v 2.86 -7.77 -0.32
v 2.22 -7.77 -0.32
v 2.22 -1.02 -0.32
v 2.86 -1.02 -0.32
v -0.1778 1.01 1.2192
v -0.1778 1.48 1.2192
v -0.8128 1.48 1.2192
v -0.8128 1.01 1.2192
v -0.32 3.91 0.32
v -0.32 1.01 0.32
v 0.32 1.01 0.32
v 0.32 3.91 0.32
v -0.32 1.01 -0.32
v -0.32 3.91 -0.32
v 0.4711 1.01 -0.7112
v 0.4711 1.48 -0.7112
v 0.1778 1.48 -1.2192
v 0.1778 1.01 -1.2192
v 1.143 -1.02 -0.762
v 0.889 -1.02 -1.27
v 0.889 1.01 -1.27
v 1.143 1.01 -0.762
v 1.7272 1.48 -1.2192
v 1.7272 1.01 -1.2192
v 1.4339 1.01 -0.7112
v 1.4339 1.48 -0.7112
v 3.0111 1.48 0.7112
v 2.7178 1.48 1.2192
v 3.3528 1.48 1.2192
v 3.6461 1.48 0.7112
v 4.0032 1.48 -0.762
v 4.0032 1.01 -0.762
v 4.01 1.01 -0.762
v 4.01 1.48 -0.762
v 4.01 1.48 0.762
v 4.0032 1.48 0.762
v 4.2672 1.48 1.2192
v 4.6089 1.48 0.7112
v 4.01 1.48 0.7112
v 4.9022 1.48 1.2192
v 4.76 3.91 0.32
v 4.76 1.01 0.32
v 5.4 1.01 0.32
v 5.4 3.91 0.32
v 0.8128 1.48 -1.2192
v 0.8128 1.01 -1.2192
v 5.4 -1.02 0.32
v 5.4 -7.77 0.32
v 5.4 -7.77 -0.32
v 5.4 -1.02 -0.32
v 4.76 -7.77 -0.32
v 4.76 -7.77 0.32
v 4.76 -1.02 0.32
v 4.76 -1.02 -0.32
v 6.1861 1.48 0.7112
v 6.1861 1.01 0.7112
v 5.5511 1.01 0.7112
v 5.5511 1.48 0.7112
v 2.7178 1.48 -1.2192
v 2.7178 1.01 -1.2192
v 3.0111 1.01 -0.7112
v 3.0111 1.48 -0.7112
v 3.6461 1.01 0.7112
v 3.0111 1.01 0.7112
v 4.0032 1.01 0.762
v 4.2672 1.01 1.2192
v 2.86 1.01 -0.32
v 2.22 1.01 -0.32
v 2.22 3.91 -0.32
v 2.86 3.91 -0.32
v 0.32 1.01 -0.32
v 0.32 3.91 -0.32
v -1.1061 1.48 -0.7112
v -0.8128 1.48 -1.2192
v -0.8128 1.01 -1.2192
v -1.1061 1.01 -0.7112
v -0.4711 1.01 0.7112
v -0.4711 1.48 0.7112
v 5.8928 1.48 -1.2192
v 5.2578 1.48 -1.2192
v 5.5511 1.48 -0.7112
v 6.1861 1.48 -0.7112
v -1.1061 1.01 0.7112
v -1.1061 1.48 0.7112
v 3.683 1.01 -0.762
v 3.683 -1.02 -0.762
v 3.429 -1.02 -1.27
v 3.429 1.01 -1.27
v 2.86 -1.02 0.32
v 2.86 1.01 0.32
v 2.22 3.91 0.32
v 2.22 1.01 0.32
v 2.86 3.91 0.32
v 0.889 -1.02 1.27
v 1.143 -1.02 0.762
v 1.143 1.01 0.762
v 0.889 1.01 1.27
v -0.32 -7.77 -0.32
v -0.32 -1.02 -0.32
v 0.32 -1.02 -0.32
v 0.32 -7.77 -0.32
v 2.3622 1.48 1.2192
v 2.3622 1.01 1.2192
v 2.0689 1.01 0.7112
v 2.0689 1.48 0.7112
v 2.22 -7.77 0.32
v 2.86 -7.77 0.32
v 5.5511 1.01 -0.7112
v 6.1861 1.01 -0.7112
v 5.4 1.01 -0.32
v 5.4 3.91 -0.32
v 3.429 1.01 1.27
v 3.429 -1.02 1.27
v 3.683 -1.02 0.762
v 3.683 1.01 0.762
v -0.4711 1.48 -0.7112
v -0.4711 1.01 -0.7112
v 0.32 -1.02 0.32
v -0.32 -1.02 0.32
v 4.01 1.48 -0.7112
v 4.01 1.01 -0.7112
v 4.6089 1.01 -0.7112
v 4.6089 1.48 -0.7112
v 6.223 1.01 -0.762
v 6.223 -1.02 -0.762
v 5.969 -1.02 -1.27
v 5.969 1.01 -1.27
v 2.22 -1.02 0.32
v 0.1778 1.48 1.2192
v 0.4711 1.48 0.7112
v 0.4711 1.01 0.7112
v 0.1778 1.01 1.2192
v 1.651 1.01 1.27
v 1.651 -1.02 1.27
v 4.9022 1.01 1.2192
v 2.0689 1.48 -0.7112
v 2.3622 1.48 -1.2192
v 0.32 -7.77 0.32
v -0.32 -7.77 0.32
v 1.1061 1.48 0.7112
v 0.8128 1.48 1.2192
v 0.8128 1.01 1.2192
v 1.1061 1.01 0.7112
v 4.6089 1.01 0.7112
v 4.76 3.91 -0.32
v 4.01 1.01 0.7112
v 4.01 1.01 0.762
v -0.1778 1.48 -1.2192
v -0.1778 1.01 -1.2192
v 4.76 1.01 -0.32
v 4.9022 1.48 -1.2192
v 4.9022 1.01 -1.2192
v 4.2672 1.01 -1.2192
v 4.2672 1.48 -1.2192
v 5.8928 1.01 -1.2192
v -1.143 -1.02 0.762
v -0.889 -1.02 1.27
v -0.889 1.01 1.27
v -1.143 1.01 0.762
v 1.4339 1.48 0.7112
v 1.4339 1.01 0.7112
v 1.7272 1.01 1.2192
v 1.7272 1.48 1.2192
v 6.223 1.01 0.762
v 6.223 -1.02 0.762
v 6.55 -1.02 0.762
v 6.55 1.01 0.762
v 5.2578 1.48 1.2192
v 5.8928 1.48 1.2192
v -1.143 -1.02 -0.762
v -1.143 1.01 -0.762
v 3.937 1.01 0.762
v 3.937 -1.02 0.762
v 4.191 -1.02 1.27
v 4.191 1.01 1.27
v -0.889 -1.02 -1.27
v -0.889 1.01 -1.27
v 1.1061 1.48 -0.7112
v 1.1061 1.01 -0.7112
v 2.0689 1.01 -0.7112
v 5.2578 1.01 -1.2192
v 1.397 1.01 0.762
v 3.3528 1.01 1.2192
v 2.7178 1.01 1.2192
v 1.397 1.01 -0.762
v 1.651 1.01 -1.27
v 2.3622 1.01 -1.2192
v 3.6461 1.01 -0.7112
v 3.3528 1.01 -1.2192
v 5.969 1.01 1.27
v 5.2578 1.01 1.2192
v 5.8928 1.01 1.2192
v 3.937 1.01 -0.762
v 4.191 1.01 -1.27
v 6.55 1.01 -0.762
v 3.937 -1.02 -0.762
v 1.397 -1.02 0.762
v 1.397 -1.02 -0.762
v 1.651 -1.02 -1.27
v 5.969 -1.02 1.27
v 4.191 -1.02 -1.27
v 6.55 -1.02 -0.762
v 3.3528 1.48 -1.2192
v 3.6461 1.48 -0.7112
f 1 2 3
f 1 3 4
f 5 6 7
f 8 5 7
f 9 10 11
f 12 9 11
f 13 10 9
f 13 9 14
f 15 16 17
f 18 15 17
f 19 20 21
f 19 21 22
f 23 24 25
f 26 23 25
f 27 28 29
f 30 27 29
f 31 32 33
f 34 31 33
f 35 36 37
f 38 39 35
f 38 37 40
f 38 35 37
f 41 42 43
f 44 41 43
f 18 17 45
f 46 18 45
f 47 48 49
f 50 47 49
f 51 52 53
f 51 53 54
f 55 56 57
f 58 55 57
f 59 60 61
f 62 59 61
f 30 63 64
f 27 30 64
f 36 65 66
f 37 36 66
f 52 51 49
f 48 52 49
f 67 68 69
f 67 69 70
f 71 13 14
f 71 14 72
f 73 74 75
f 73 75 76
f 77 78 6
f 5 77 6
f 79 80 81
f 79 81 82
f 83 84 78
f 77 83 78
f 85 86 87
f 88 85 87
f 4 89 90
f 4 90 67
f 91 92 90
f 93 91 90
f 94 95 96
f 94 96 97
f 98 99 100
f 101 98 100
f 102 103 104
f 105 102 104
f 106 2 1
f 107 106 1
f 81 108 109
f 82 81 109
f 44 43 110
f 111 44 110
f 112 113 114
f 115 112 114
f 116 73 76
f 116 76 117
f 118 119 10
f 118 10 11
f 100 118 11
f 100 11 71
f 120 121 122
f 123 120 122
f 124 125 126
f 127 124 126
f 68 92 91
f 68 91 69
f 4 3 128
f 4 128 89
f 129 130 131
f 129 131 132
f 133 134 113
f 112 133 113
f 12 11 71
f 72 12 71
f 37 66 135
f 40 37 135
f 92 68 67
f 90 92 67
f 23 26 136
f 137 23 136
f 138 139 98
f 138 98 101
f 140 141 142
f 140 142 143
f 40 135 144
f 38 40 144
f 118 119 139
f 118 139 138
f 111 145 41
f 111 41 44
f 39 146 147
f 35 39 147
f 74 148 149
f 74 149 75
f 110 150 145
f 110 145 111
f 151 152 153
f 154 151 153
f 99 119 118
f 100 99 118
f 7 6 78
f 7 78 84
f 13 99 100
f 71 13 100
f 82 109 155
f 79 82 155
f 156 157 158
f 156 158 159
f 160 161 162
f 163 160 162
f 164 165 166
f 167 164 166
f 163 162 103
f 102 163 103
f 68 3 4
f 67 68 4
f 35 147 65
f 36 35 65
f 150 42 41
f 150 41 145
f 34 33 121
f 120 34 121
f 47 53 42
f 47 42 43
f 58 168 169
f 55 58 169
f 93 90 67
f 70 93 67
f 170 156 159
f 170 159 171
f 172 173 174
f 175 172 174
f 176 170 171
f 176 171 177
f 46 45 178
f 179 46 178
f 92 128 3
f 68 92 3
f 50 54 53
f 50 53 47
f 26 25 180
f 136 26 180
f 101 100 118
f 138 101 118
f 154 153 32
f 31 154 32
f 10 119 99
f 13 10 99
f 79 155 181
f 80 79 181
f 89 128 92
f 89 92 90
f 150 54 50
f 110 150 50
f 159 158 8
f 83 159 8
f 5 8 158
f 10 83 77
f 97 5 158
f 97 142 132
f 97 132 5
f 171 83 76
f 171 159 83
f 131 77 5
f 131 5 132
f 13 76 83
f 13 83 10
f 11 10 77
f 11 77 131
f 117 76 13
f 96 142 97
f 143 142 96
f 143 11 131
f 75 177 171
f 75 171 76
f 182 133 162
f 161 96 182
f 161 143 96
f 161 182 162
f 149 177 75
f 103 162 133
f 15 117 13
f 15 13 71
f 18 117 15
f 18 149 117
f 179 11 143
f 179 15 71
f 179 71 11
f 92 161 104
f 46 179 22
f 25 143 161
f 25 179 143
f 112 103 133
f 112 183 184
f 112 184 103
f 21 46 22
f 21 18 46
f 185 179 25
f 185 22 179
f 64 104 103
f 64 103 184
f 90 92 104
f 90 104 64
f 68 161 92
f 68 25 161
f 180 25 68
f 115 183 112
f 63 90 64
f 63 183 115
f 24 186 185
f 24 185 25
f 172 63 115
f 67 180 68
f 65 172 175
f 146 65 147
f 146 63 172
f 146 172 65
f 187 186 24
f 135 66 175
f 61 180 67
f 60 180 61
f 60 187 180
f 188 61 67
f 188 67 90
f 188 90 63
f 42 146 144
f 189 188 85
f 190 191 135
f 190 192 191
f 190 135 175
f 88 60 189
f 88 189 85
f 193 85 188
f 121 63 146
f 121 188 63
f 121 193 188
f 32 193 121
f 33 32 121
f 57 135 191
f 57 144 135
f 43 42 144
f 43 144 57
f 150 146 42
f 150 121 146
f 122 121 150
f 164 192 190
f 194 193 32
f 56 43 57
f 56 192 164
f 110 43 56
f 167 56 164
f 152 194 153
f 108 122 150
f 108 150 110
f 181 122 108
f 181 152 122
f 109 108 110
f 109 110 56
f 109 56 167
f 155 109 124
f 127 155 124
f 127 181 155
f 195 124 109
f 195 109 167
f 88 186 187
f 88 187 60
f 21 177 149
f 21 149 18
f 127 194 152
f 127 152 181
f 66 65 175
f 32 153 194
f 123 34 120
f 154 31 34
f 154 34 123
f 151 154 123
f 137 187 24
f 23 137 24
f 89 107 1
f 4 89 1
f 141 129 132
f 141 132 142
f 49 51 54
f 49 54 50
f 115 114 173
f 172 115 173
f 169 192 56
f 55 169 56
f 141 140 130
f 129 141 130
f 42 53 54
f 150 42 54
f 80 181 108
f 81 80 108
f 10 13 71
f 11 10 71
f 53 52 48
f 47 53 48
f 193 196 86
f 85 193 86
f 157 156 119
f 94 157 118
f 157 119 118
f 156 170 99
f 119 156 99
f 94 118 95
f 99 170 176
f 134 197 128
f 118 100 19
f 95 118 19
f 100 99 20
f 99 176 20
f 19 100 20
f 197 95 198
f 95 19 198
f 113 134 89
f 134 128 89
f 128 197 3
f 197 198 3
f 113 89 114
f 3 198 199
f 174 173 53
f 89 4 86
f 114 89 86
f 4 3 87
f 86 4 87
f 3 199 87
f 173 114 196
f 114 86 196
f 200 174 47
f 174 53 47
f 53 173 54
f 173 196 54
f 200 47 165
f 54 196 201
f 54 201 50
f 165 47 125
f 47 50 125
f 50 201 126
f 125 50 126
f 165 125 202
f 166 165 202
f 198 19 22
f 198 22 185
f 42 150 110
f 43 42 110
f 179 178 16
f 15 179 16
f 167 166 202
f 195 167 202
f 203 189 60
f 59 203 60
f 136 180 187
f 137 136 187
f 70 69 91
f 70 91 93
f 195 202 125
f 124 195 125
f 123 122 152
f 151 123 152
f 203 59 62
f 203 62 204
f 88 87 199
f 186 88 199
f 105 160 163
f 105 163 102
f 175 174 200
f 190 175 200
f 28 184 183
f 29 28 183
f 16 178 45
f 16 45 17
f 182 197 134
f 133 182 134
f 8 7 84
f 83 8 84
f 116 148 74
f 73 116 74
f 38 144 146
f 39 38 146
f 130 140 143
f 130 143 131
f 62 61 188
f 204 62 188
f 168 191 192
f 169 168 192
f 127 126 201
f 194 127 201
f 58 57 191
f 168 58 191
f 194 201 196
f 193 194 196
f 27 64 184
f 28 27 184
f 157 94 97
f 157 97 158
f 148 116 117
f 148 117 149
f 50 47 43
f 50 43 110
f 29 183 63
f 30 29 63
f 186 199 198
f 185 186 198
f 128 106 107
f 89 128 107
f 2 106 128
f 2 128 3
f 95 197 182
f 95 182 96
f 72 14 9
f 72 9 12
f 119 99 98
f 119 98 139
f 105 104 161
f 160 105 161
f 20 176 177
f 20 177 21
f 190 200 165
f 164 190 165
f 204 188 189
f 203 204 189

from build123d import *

# Parameters (mm, degrees)
BOSS_EXTRUDE1_START = -1.02
SKETCH1_W           = 0.64
SKETCH1_H           = 0.64
BOSS_EXTRUDE1_DEPTH = 2.5
CUT_EXTRUDE2_DEPTH  = 0.47
SKETCH3_W           = 0.64
SKETCH3_H           = 0.64
BOSS_EXTRUDE2_DEPTH = 2.9
SKETCH4_W           = 0.64
SKETCH4_H           = 0.64
BOSS_EXTRUDE3_DEPTH = 6.75
LPATTERN1_COUNT     = 3
LPATTERN1_PITCH     = 2.54


with BuildPart() as part:
    # Sketch1 → Boss-Extrude1 (new body)
    with BuildSketch(Plane(origin=(0, 0, 0), x_dir=(1, 0, 0), z_dir=(0, 1, 0)).offset(BOSS_EXTRUDE1_START)):
        Polygon((-1.143, 0.762), (-0.889, 1.27), (0.889, 1.27), (1.143, 0.762), (1.47, 0.762), (1.47, -0.762), (1.143, -0.762), (0.889, -1.27), (-0.889, -1.27), (-1.143, -0.762), align=None)
        Rectangle(SKETCH1_W, SKETCH1_H, mode=Mode.SUBTRACT)
    boss_extrude1 = extrude(amount=BOSS_EXTRUDE1_DEPTH)

    # Sketch2 → Cut-Extrude2 (cut)
    with BuildSketch(Plane(origin=(0, 1.48, 0), x_dir=(1, 0, 0), z_dir=(0, 1, 0))):
        Polygon((-1.143, 0.762), (-1.143, -0.762), (-0.889, -1.27), (0.889, -1.27), (1.143, -0.762), (1.47, -0.762), (1.47, 0.762), (1.143, 0.762), (0.889, 1.27), (-0.889, 1.27), align=None)
        Polygon((-1.106093937, -0.7112), (-0.471093937, -0.7112), (-0.1778, -1.2192), (-0.8128, -1.2192), align=None, mode=Mode.SUBTRACT)
        Polygon((-0.8128, 1.2192), (-1.106093937, 0.7112), (-0.471093937, 0.7112), (-0.1778, 1.2192), align=None, mode=Mode.SUBTRACT)
        Polygon((1.106093937, 0.7112), (0.471093937, 0.7112), (0.1778, 1.2192), (0.8128, 1.2192), align=None, mode=Mode.SUBTRACT)
        Polygon((0.8128, -1.2192), (1.106093937, -0.7112), (0.471093937, -0.7112), (0.1778, -1.2192), align=None, mode=Mode.SUBTRACT)
    cut_extrude2 = extrude(amount=-CUT_EXTRUDE2_DEPTH, mode=Mode.SUBTRACT)


with BuildPart() as body_2:
    # Sketch3 → Boss-Extrude2 (new body)
    with BuildSketch(Plane(origin=(0, 1.01, 0), x_dir=(1, 0, 0), z_dir=(0, 1, 0))):
        Rectangle(SKETCH3_W, SKETCH3_H)
    boss_extrude2 = extrude(amount=BOSS_EXTRUDE2_DEPTH)


with BuildPart() as body_3:
    # Sketch4 → Boss-Extrude3 (new body)
    with BuildSketch(Plane.XZ.offset(1.02)):
        Rectangle(SKETCH4_W, SKETCH4_H)
    boss_extrude3 = extrude(amount=BOSS_EXTRUDE3_DEPTH)


with BuildPart() as part_1:
    add(part.part)

    # LPattern1: Boss-Extrude1, Cut-Extrude2, Boss-Extrude2, Boss-Extrude3 ×3
    with Locations(*[(i * LPATTERN1_PITCH, 0, 0) for i in range(1, LPATTERN1_COUNT)]):
        add(boss_extrude1)
        add(cut_extrude2, mode=Mode.SUBTRACT)
        add(boss_extrude2)
        add(boss_extrude3)


solid = Compound([body_2.part, body_3.part, part_1.part])
